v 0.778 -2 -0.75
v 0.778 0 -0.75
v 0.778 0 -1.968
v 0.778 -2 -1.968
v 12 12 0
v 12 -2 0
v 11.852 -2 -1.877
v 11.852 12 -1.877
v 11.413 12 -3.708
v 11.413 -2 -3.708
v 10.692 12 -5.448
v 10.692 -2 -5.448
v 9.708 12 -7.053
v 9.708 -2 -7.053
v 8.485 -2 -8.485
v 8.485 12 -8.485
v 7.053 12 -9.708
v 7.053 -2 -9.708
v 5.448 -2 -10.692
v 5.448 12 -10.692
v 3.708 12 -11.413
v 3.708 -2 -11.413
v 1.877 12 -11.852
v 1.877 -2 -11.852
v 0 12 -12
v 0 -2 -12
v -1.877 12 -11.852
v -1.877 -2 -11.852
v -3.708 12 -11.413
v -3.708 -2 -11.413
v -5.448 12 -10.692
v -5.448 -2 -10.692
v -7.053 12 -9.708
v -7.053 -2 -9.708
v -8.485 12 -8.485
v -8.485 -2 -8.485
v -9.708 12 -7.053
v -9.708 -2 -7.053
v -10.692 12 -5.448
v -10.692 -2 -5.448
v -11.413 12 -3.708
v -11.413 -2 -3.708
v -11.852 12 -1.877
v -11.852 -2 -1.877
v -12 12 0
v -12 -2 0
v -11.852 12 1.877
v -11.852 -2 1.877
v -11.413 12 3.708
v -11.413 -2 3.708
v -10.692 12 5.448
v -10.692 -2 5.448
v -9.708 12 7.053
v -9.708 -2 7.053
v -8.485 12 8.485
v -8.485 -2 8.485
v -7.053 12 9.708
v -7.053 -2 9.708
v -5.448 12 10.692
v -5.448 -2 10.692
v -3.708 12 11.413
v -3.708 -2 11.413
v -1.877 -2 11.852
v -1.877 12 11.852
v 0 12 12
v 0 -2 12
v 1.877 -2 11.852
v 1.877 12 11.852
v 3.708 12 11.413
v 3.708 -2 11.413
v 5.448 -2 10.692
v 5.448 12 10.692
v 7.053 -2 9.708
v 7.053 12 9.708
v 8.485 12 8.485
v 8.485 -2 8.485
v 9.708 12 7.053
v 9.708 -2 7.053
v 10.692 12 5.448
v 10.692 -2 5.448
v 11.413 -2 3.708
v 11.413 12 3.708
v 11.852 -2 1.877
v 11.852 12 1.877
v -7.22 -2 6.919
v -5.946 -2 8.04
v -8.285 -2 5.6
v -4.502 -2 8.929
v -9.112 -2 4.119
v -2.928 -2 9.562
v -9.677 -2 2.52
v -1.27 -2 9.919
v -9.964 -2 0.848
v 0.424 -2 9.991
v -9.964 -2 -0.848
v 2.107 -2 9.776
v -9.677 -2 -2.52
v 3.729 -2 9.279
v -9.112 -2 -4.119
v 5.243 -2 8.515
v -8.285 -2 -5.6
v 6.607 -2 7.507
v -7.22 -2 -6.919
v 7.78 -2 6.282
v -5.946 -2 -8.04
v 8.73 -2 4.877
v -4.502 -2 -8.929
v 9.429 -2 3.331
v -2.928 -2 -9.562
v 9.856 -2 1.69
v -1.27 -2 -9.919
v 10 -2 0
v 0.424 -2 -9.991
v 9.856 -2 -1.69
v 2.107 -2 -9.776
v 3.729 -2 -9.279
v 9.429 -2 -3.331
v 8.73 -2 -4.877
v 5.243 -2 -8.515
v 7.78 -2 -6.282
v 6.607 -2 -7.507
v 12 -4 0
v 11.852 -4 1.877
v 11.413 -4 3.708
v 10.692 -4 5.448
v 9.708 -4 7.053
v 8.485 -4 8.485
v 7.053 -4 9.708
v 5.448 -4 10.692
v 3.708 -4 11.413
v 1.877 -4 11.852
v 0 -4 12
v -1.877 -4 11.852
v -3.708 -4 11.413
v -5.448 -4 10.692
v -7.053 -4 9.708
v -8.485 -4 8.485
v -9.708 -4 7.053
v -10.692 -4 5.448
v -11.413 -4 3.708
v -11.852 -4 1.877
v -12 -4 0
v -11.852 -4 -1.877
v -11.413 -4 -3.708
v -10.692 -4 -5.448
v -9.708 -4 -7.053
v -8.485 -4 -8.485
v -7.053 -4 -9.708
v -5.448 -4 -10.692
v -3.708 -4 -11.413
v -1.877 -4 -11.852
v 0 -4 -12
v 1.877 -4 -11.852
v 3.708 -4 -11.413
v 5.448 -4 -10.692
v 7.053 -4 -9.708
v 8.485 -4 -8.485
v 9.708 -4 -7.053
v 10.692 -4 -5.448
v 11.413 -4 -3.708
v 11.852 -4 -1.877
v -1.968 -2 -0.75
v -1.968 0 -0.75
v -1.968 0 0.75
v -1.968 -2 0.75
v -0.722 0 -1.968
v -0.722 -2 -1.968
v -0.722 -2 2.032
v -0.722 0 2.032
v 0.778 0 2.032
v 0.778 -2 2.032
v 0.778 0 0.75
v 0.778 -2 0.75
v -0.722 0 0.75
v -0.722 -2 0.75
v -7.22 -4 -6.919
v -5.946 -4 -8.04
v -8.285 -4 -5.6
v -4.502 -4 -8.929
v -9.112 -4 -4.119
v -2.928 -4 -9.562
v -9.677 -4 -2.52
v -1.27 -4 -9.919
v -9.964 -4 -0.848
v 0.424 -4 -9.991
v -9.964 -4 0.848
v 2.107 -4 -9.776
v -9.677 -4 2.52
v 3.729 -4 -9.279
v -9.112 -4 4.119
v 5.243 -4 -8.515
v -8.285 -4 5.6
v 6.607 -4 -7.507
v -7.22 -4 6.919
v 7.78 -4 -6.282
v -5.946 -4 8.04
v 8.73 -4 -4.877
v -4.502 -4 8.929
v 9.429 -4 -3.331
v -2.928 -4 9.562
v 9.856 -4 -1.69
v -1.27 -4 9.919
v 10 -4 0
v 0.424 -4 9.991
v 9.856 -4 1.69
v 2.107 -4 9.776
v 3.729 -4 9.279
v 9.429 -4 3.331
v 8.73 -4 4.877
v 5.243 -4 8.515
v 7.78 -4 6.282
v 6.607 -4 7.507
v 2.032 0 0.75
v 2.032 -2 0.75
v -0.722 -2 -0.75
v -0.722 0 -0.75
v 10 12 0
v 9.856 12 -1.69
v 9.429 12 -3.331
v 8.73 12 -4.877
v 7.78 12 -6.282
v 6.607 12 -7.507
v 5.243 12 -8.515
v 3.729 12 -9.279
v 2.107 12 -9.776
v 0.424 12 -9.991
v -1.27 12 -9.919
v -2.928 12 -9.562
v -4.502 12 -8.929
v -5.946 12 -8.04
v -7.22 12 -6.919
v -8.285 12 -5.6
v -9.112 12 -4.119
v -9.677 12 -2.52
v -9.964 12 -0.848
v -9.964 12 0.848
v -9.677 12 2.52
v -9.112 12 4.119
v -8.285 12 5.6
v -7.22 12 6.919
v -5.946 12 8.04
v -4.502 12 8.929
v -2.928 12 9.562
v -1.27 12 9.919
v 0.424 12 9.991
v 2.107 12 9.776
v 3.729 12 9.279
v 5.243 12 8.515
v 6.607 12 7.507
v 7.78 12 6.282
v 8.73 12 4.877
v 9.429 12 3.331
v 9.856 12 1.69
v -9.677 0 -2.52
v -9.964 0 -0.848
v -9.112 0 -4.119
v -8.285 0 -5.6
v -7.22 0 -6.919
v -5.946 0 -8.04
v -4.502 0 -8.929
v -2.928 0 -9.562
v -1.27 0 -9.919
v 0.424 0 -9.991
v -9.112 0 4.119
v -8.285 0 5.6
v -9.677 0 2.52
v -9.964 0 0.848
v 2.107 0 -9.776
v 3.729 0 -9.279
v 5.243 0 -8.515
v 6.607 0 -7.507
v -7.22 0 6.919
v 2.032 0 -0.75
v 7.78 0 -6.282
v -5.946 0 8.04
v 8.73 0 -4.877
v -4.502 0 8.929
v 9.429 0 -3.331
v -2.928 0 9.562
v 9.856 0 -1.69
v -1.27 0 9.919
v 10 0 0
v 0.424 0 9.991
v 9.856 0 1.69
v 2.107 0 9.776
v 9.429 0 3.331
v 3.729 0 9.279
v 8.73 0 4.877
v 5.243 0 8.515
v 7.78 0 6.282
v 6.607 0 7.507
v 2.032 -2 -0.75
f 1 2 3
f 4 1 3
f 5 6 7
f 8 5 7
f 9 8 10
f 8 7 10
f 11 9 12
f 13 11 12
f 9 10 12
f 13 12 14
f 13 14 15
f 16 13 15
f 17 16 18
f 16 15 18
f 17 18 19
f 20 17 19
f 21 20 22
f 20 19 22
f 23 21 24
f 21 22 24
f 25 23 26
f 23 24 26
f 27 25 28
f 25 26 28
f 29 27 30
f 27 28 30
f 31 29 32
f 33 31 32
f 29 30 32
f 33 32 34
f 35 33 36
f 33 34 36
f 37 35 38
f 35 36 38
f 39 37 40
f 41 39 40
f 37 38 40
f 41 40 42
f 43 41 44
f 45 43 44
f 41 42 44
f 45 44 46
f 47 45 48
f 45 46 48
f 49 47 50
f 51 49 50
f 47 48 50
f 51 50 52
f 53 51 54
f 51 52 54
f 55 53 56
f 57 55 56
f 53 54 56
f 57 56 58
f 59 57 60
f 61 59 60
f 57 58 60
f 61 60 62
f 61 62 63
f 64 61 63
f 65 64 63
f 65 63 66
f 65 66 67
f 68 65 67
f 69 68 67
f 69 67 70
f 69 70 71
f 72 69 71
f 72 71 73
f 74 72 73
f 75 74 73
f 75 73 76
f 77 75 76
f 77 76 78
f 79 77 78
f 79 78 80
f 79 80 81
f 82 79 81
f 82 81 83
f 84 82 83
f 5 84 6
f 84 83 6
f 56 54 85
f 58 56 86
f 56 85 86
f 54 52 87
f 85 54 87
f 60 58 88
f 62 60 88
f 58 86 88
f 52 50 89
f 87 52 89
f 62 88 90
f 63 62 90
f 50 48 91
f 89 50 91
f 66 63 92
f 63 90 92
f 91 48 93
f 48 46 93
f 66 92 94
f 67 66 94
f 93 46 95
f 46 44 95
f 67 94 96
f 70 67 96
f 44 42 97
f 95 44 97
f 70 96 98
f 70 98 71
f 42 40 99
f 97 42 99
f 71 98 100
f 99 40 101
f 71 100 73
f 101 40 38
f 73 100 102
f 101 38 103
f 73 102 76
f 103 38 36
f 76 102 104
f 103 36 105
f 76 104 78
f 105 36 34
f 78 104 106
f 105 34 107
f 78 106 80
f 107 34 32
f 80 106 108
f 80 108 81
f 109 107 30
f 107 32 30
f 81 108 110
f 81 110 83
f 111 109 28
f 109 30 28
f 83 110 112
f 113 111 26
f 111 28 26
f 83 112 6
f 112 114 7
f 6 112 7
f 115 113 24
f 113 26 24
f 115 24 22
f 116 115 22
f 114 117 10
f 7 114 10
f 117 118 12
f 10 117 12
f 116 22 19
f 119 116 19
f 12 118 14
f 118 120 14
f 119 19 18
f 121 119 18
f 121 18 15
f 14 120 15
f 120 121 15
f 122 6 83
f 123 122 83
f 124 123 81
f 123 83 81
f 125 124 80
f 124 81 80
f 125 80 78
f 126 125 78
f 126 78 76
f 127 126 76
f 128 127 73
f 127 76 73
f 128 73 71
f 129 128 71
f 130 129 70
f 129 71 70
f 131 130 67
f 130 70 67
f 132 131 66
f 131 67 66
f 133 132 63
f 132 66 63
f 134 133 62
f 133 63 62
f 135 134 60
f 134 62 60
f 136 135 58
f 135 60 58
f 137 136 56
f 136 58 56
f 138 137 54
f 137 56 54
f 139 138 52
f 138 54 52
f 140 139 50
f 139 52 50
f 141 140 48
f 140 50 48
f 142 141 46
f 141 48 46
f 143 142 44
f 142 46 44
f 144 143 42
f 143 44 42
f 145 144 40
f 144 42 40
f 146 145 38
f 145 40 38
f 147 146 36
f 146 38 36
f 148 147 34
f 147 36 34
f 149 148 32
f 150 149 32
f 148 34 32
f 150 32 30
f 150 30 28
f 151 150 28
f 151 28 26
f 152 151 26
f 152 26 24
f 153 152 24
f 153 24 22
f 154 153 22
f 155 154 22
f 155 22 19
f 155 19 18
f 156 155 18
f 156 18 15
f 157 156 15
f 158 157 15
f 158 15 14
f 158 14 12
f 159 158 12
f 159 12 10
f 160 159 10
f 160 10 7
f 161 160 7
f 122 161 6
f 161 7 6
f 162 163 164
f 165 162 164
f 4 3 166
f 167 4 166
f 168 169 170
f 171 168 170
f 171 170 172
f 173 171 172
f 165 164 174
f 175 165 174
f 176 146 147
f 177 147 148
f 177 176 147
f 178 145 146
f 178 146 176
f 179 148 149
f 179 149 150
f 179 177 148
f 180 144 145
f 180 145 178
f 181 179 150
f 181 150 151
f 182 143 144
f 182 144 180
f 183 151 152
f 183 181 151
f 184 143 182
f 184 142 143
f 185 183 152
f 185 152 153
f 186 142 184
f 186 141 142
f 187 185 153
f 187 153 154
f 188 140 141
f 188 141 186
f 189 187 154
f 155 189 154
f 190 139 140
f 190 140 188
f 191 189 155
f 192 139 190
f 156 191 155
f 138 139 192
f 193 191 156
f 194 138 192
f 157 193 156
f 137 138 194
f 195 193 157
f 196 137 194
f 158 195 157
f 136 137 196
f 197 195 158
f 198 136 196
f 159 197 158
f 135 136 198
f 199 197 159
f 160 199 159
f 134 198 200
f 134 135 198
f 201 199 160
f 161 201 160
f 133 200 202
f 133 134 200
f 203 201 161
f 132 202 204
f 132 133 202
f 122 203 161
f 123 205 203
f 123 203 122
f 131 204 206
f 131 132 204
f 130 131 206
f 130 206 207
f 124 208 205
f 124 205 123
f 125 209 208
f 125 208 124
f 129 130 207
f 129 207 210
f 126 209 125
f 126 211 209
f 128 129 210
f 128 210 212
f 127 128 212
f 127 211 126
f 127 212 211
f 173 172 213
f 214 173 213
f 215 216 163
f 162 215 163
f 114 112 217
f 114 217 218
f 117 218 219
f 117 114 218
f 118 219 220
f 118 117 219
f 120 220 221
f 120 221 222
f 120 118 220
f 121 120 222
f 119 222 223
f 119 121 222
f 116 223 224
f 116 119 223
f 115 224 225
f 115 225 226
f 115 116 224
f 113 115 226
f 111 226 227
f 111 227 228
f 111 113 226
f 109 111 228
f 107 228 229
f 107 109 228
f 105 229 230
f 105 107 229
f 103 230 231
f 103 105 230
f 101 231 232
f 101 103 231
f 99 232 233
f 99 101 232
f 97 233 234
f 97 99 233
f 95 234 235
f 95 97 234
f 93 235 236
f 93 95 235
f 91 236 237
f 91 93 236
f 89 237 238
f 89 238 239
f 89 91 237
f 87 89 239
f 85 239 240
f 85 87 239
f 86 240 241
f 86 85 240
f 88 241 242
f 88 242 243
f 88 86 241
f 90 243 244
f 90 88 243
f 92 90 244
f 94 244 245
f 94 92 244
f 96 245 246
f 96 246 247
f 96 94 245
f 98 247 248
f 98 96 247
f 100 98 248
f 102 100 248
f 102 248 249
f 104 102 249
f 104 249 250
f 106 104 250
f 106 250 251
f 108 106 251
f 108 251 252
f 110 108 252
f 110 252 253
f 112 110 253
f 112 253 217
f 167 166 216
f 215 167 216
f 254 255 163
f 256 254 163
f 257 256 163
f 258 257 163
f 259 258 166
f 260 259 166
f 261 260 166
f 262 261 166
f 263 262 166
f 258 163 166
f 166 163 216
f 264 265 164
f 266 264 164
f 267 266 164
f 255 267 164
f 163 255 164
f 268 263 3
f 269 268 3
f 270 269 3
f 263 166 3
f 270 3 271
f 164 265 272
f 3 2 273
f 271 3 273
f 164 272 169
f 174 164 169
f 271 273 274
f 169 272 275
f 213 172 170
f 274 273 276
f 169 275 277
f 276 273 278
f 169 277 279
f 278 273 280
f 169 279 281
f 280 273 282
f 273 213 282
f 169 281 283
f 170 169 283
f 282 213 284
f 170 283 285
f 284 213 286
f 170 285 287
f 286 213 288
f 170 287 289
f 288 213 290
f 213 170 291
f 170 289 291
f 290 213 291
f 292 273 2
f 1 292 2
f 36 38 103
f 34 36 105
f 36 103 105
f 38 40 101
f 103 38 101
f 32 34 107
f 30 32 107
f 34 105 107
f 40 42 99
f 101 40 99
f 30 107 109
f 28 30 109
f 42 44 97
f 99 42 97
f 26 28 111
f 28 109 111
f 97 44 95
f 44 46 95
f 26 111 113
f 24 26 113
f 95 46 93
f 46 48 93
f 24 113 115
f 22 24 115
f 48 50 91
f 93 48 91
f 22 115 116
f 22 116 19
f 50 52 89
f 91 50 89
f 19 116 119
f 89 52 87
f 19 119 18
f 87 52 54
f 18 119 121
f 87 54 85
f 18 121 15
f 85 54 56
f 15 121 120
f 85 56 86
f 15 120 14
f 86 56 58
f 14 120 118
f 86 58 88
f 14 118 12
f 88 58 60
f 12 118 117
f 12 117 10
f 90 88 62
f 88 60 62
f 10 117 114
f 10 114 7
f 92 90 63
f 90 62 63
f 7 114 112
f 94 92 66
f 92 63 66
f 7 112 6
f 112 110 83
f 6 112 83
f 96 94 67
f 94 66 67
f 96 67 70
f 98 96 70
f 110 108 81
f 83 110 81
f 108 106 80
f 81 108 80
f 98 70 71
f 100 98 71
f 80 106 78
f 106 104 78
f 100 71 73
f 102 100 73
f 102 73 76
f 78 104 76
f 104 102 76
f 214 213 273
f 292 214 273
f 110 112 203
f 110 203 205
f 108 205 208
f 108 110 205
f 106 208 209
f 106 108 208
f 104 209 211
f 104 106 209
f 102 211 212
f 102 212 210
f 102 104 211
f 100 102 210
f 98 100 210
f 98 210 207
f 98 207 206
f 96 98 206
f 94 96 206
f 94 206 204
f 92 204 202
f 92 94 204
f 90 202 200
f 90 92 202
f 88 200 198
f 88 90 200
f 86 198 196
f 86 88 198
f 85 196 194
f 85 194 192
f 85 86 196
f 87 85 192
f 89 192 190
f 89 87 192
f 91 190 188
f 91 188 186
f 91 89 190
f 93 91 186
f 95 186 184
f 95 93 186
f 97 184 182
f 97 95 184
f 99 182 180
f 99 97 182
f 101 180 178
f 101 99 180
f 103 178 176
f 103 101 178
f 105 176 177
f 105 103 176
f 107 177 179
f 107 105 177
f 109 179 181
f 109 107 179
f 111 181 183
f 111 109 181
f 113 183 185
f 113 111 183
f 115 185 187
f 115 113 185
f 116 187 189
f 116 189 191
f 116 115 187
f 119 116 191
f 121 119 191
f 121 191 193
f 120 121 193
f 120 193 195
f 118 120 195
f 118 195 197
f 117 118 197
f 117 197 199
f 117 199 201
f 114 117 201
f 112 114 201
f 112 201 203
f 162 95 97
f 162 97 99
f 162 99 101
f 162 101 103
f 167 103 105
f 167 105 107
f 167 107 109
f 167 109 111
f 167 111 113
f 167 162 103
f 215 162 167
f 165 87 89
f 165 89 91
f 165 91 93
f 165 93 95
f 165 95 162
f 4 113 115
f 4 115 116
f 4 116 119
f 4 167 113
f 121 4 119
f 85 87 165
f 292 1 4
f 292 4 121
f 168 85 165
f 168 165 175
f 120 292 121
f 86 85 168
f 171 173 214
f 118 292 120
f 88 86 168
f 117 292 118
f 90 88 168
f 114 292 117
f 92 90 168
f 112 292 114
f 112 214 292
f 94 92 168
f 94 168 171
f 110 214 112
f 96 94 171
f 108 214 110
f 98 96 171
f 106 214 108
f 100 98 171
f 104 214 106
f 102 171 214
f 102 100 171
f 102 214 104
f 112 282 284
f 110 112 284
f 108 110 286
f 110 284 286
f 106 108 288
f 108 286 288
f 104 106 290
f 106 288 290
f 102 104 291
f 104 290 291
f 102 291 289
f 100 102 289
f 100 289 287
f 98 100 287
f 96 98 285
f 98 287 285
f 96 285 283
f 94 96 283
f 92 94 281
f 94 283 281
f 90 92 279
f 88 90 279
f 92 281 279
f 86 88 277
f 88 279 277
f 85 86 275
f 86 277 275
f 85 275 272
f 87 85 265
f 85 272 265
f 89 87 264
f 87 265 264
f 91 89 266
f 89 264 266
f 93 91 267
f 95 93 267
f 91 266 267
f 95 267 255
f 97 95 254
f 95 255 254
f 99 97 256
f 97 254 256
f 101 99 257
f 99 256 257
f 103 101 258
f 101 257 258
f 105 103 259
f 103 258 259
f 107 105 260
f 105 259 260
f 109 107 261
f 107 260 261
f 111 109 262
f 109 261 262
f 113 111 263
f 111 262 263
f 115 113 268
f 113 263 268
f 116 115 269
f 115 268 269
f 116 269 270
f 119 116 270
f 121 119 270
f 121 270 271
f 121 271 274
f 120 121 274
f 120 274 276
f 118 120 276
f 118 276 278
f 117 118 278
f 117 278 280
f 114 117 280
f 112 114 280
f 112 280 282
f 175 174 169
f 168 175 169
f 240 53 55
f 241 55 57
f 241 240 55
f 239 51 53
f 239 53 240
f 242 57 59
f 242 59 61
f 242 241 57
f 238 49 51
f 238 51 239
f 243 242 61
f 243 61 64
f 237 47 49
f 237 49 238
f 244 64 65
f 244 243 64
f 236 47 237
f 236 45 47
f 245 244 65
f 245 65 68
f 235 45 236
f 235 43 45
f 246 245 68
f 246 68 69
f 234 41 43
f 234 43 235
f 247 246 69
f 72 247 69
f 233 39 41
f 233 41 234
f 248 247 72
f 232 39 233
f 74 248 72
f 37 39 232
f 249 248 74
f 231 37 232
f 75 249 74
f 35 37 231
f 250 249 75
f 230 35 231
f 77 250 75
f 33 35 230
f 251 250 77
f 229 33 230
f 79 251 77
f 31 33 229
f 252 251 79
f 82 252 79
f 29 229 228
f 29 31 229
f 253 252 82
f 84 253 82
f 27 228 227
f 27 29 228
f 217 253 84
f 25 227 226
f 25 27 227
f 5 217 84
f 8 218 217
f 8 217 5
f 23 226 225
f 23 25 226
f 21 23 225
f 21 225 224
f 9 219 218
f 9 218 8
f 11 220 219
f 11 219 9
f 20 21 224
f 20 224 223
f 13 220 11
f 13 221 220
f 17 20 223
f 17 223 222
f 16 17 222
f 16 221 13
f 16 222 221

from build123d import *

# Parameters (mm, degrees)
F0_R        = 10
F1_DEPTH    = 2
F2_R        = 12
F2_R_2      = 10
F3_DEPTH    = 2
F3_FACE_R   = 12
F3_FACE_R_2 = 10
F4_DEPTH    = 14


with BuildPart() as f1:
    # F0 (on Front) → F1 (new body)
    with BuildSketch(Plane.XZ):
        Circle(F0_R)
        Polygon((-0.722205, 2.032), (0.027795, 2.032), (0.777795, 2.032), (0.777795, 0.75), (2.032042, 0.75), (2.032042, 0), (2.032042, -0.75), (0.777795, -0.75), (0.777795, -1.968), (0.027795, -1.968), (-0.722205, -1.968), (-0.722205, -0.75), (-1.967958, -0.75), (-1.967958, 0), (-1.967958, 0.75), (-0.722205, 0.75), align=None, mode=Mode.SUBTRACT)
    extrude(amount=F1_DEPTH)

    # F2 (on face) → F3 (join)
    with BuildSketch(Plane.XZ.offset(2)):
        Circle(F2_R)
        Circle(F2_R_2, mode=Mode.SUBTRACT)
    extrude(amount=F3_DEPTH)


with BuildPart() as f4:
    # F3_face (on face) → F4 (new body)
    with BuildSketch(Plane(origin=(0, -2, 0), x_dir=(1, 0, 0), z_dir=(0, 1, 0))):
        Circle(F3_FACE_R)
        Circle(F3_FACE_R_2, mode=Mode.SUBTRACT)
    extrude(amount=F4_DEPTH)


solid = Compound([f1.part, f4.part])
